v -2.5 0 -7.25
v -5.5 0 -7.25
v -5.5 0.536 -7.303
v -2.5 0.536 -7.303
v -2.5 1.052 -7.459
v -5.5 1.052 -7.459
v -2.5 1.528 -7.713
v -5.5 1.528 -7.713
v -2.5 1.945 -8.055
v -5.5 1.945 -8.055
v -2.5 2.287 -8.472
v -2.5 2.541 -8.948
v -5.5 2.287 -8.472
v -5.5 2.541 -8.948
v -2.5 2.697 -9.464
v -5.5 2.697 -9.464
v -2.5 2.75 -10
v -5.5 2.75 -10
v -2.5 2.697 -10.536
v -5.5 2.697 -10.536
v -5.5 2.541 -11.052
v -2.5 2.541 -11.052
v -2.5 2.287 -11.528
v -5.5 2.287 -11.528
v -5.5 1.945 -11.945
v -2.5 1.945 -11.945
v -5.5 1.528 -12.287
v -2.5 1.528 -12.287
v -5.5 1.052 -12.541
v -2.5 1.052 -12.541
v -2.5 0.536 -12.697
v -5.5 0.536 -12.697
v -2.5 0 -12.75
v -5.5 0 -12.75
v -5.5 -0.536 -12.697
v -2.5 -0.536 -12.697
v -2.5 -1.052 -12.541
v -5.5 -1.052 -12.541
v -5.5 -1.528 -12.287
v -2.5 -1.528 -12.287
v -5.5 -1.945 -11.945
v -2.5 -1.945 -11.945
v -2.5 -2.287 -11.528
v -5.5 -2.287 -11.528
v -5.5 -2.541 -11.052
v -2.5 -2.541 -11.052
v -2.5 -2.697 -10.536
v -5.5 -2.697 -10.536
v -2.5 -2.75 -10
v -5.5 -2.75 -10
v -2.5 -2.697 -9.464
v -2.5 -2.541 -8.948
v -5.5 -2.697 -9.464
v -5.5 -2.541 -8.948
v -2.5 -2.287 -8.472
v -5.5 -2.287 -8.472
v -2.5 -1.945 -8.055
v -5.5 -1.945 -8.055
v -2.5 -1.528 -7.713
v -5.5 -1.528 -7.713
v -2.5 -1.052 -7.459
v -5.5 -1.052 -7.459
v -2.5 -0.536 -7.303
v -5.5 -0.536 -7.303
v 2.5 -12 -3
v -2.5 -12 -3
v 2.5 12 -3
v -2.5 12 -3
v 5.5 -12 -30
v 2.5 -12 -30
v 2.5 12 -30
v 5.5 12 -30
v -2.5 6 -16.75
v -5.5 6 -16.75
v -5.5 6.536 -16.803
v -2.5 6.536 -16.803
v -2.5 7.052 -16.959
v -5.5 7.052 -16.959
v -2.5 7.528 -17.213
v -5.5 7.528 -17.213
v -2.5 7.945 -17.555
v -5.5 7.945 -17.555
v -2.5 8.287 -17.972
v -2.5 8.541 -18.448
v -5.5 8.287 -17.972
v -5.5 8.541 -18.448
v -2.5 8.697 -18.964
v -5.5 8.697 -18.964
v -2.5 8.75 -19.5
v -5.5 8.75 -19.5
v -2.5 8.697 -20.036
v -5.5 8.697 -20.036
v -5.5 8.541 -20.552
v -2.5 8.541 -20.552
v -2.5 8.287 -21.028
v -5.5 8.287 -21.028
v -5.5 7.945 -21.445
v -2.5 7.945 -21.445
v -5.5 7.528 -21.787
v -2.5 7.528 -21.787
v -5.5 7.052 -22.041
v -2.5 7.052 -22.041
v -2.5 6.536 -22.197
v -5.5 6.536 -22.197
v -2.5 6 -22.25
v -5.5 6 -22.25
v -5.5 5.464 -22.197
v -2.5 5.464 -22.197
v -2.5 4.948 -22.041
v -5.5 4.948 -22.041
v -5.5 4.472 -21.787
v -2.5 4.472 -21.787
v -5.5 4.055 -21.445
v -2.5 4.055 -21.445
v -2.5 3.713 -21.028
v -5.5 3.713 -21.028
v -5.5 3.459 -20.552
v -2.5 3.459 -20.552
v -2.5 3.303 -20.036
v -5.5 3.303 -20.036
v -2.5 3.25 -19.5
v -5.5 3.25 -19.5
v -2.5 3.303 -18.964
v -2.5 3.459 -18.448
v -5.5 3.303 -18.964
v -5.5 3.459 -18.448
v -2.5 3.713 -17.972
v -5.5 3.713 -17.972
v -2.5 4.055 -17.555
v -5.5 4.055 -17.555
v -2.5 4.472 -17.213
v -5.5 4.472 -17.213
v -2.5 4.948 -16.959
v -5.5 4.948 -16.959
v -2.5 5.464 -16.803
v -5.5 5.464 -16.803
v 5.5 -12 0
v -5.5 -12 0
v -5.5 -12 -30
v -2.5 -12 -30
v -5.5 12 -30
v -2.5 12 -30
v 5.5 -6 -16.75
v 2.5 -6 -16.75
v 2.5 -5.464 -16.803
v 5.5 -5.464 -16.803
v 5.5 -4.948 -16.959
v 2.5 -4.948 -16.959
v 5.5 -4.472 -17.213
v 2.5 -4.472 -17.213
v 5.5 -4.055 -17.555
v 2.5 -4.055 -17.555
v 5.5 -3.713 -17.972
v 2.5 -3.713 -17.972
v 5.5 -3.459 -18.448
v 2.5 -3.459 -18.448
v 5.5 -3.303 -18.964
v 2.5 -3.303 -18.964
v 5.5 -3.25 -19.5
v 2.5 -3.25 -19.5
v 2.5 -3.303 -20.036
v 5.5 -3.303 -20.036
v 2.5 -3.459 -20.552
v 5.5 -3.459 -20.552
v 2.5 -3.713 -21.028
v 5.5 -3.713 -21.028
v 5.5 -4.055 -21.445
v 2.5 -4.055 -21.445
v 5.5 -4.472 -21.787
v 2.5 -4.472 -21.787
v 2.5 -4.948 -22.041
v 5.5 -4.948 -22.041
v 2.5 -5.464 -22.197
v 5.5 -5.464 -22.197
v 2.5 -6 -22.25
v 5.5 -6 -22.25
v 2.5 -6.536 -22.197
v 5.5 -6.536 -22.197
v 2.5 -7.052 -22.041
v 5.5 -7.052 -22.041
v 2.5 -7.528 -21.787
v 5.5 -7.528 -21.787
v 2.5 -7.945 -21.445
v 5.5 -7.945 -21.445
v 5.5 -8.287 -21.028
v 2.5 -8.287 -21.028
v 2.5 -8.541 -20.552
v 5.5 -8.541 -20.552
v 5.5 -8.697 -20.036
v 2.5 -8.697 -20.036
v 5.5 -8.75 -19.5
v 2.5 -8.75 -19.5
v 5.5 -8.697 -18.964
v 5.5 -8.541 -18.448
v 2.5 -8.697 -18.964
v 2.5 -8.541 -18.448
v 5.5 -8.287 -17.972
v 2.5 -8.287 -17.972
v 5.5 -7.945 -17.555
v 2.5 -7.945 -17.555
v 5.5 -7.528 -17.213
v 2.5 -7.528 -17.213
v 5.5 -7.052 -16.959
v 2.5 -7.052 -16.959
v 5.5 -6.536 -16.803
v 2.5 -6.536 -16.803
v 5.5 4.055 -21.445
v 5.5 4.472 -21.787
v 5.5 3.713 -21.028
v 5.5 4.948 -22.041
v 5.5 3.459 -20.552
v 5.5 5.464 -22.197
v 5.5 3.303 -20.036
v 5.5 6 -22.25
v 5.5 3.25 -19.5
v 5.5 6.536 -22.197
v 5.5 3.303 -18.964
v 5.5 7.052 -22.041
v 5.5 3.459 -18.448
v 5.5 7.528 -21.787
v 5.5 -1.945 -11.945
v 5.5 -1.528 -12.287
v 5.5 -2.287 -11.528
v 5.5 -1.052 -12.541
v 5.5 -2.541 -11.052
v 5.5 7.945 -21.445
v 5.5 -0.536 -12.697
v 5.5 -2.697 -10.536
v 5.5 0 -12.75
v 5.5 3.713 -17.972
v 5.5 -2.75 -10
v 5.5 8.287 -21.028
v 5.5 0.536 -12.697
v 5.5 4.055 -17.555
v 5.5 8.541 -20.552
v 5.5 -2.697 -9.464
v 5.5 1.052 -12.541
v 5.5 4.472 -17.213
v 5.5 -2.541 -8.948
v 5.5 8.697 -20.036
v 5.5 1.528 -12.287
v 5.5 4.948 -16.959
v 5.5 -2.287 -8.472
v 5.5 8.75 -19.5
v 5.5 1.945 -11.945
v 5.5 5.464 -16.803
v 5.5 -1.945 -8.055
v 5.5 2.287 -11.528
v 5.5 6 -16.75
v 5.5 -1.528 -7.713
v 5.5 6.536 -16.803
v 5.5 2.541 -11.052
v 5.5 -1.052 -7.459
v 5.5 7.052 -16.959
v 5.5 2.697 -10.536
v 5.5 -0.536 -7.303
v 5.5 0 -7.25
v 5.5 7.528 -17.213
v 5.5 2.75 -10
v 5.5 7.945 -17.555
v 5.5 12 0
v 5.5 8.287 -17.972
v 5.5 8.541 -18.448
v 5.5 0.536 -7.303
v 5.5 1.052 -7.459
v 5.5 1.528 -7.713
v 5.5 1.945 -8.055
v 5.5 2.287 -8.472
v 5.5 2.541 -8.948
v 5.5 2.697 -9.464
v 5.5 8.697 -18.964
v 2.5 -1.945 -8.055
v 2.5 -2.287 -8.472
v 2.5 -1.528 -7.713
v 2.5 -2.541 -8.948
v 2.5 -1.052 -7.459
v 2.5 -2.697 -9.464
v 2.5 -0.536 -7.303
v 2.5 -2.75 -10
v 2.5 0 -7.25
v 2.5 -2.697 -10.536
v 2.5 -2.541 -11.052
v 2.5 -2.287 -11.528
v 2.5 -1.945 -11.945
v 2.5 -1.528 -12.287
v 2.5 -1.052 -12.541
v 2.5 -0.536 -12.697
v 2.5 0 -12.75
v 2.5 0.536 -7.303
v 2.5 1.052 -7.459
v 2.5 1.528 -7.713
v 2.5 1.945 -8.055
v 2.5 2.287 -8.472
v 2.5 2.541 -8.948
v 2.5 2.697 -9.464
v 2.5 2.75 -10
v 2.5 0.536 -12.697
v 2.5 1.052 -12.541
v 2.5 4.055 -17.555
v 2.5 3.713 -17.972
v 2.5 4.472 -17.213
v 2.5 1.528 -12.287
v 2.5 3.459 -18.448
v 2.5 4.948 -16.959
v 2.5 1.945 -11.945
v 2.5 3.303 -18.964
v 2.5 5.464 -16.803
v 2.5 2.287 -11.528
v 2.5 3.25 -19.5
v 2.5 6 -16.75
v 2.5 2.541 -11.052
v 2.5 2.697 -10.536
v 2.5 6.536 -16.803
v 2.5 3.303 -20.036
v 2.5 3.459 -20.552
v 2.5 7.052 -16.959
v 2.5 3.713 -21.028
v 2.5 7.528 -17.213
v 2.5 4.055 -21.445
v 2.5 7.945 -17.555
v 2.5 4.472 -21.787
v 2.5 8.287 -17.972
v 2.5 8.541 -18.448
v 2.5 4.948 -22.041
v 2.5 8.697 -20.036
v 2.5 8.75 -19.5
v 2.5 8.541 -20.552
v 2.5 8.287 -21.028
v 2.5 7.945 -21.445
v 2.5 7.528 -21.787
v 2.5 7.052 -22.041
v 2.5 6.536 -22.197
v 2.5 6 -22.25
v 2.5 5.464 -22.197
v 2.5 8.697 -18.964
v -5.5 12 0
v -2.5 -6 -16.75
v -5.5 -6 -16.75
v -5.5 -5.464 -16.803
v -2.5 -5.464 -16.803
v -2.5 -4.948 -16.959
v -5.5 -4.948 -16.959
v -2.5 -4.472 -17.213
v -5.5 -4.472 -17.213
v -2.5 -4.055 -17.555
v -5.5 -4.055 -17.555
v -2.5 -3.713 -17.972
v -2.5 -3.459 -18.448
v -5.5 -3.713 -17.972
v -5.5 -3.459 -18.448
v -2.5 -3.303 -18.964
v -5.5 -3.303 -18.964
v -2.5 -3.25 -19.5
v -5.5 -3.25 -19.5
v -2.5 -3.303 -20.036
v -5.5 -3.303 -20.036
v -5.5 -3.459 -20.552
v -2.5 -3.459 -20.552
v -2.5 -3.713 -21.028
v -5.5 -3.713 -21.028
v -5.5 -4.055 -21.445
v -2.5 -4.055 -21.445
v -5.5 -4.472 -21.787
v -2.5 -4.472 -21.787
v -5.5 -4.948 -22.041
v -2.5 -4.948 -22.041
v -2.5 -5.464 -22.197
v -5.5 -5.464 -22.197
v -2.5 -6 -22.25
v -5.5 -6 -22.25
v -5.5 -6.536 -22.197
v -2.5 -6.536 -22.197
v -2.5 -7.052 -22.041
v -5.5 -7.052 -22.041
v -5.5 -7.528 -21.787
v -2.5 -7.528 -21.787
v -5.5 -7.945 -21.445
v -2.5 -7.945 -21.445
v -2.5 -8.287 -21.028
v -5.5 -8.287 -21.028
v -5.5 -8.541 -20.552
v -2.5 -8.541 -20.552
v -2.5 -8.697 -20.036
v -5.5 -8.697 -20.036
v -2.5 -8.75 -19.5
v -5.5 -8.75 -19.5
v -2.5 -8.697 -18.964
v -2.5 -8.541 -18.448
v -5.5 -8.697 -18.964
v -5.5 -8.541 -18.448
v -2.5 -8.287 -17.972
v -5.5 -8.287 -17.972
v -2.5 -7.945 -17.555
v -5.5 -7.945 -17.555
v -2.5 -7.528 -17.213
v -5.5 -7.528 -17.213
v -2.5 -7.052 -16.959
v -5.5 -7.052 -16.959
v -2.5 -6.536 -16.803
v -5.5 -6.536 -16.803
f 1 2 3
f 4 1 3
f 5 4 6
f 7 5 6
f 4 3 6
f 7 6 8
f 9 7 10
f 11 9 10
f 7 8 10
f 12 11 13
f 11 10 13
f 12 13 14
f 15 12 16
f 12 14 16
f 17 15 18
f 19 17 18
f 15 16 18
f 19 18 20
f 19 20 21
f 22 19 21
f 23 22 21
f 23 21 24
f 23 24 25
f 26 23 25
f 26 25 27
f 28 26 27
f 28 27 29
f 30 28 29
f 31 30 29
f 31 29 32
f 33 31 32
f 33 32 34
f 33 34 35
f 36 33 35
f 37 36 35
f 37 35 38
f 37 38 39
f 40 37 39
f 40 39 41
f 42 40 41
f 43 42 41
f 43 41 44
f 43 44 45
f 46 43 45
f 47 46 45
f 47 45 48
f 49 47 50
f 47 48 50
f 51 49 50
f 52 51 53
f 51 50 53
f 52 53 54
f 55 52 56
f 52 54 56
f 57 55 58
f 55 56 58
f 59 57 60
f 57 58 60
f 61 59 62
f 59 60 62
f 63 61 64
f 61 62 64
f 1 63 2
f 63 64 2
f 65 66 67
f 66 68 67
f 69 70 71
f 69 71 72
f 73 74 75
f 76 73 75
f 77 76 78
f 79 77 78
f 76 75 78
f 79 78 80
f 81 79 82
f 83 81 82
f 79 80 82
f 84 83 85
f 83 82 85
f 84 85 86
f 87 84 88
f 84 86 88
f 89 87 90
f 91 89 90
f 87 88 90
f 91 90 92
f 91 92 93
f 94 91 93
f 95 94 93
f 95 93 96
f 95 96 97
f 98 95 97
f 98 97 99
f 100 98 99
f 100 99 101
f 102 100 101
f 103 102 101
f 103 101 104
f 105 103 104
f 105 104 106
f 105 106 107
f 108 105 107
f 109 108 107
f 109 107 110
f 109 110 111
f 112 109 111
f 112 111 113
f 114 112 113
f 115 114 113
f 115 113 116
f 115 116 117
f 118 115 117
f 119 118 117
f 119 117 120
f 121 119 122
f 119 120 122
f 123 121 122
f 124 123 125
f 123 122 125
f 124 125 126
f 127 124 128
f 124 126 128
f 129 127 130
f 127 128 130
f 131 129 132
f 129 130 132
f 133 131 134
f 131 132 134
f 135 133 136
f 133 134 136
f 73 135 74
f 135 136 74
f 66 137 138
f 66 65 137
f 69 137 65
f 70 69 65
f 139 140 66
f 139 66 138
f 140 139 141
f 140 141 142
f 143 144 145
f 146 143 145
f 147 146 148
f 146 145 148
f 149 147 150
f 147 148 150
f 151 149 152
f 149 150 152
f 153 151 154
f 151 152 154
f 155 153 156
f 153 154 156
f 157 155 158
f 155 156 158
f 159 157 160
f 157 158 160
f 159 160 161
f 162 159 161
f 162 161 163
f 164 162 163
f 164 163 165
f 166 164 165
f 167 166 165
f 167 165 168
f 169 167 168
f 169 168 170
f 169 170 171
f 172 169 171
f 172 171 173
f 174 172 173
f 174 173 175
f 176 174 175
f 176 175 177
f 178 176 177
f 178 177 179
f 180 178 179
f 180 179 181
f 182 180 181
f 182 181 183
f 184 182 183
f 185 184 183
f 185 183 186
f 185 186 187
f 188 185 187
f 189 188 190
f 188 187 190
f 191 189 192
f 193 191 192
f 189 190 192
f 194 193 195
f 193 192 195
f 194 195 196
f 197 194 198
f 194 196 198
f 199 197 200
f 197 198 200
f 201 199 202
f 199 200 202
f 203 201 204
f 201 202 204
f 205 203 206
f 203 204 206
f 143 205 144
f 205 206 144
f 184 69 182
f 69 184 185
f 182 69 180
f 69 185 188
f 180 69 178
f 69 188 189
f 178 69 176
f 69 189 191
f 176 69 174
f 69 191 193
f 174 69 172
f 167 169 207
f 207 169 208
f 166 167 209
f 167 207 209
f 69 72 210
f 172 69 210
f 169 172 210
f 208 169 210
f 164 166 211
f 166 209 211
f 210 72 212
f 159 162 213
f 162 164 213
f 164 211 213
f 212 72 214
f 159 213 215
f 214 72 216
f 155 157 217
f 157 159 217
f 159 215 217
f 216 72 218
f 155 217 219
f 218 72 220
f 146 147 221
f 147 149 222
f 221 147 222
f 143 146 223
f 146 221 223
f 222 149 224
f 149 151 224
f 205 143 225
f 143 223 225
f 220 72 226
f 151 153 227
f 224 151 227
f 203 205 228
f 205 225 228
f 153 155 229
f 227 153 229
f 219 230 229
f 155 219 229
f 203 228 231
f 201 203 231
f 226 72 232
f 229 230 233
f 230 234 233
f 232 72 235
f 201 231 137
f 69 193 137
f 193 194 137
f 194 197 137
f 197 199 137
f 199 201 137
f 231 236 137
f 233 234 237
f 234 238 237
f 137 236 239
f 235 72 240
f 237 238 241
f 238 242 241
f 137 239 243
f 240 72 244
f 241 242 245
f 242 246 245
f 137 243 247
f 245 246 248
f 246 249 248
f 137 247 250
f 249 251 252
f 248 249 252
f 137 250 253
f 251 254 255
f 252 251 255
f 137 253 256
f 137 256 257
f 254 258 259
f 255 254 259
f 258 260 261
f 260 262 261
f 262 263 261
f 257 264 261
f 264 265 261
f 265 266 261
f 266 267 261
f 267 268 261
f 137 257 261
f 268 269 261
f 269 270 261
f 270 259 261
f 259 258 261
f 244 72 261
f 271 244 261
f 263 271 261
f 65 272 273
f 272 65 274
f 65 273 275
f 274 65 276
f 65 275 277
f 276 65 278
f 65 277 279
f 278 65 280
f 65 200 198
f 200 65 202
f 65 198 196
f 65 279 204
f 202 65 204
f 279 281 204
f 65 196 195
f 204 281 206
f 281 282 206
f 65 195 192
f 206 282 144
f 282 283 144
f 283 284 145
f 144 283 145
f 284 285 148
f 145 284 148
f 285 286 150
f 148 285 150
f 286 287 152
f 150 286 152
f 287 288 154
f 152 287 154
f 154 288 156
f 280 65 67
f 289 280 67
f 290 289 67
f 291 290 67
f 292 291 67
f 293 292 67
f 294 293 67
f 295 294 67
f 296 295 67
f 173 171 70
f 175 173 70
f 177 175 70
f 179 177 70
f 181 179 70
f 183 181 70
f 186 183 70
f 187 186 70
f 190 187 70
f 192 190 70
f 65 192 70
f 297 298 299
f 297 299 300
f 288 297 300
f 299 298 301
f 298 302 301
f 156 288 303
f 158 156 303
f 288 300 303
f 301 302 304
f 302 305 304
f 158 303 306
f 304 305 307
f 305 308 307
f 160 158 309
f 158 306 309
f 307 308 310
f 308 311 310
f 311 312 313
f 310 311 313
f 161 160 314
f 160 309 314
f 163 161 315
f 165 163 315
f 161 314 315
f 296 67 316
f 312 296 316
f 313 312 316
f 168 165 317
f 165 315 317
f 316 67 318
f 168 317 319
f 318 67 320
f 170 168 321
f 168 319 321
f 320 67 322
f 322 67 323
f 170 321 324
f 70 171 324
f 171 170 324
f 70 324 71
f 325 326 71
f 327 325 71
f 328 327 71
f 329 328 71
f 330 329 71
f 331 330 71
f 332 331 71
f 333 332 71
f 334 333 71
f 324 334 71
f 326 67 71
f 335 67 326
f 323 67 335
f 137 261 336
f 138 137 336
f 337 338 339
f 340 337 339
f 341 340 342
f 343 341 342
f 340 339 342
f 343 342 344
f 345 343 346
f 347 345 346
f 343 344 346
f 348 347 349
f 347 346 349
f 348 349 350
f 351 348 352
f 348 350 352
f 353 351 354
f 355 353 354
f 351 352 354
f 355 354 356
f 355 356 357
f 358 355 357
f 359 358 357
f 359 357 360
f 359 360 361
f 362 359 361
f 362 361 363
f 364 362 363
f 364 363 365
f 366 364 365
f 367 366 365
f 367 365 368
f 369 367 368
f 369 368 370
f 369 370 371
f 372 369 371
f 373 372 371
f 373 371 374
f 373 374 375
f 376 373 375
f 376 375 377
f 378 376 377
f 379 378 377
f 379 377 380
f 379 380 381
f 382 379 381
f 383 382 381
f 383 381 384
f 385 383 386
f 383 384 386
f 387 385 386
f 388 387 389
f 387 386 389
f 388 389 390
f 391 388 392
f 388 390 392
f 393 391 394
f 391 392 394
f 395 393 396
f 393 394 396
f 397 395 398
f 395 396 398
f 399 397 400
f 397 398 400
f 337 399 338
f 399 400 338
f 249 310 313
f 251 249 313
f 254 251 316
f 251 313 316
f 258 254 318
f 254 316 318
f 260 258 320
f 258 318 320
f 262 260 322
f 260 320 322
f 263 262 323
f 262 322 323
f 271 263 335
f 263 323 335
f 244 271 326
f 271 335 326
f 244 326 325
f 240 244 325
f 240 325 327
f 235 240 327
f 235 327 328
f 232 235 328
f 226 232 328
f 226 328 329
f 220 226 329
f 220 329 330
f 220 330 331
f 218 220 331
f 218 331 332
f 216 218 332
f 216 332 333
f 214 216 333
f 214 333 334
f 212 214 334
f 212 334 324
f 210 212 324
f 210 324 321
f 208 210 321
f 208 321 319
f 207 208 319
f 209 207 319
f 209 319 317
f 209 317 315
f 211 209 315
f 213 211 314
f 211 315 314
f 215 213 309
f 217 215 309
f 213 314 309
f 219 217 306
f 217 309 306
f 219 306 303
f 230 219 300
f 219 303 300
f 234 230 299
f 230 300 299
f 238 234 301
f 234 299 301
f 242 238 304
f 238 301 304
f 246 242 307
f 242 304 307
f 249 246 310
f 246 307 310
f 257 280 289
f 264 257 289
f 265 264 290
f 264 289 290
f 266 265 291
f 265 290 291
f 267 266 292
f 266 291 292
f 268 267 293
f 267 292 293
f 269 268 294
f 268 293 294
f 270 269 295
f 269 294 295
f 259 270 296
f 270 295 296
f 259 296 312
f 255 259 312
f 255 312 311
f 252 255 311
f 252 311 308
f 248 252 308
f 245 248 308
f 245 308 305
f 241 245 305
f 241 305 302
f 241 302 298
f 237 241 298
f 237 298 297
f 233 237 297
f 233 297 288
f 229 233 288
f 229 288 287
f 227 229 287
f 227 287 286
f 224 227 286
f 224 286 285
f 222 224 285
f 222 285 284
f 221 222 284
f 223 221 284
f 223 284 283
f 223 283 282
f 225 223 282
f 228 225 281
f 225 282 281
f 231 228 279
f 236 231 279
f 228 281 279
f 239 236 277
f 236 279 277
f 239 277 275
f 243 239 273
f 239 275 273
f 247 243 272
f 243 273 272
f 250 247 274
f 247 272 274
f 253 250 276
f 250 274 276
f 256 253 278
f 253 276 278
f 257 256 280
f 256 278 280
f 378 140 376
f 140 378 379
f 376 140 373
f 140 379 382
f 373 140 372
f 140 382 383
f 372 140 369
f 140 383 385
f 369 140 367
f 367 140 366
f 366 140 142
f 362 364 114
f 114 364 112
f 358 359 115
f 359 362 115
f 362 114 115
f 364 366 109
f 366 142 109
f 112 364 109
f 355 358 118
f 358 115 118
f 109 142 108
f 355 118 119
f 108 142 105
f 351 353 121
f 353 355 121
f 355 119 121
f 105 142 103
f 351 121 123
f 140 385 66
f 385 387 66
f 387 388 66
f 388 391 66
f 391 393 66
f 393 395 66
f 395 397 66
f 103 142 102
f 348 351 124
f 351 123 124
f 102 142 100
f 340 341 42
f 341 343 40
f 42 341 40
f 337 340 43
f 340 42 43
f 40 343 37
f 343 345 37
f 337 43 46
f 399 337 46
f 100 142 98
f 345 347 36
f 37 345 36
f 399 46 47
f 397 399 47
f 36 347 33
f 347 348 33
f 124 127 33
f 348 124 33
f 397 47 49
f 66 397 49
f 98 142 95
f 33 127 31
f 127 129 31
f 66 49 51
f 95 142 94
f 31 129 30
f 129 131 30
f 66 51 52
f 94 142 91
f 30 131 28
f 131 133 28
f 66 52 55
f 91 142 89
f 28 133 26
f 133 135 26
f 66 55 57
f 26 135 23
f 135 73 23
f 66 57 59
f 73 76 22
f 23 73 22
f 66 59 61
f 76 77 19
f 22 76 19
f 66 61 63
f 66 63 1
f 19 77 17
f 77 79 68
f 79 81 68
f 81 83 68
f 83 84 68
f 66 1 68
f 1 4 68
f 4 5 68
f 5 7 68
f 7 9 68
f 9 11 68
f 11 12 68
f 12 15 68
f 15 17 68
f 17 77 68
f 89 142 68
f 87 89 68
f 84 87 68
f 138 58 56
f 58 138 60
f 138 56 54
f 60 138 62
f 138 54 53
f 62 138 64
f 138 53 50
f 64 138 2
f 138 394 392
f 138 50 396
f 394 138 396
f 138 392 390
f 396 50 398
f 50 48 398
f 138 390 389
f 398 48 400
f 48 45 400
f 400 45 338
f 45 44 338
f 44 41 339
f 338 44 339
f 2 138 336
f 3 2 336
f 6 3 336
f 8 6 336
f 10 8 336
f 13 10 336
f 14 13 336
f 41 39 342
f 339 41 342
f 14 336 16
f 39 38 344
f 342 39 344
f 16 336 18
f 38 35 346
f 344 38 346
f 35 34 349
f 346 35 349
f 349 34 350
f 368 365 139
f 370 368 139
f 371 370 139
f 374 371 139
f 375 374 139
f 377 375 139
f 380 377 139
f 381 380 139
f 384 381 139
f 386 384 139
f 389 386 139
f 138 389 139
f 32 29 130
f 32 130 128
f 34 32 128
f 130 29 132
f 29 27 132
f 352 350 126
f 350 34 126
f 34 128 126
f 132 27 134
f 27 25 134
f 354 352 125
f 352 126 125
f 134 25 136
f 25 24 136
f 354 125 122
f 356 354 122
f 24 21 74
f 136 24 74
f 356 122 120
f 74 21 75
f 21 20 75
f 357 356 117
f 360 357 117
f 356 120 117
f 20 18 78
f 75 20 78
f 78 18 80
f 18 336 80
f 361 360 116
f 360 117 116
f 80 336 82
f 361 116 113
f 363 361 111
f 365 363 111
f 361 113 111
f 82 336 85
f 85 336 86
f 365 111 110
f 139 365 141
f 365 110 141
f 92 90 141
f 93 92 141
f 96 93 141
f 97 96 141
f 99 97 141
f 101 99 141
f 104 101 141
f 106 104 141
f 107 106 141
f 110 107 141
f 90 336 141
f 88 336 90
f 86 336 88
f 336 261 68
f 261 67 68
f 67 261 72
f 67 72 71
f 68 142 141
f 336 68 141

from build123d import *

# Parameters (mm, degrees)
EXTRUDE_1_DEPTH     = 12
SKETCH_5_R          = 2.75
CUT_EXTRUDE_1_DEPTH = 35.132096332


with BuildPart() as part:
    # 草图1 → 凸台-拉伸1 (new, symmetric)
    with BuildSketch(Plane(origin=(0, 0, 0), x_dir=(1, 0, 0), z_dir=(0, 1, 0))):
        Polygon((5.5, 0), (-5.5, 0), (-5.5, 30), (-2.5, 30), (-2.5, 3), (2.5, 3), (2.5, 30), (5.5, 30), align=None)
    extrude(amount=EXTRUDE_1_DEPTH, both=True)

    # 草图5 → 切除-拉伸1 (cut, through all)
    with BuildSketch(Plane.ZY.offset(5.5)):
        with Locations((-10, 0)):
            Circle(SKETCH_5_R)
        with Locations((-19.5, 6)):
            Circle(SKETCH_5_R)
        with Locations((-19.5, -6)):
            Circle(SKETCH_5_R)
    extrude(amount=-CUT_EXTRUDE_1_DEPTH, mode=Mode.SUBTRACT)


solid = part.part
